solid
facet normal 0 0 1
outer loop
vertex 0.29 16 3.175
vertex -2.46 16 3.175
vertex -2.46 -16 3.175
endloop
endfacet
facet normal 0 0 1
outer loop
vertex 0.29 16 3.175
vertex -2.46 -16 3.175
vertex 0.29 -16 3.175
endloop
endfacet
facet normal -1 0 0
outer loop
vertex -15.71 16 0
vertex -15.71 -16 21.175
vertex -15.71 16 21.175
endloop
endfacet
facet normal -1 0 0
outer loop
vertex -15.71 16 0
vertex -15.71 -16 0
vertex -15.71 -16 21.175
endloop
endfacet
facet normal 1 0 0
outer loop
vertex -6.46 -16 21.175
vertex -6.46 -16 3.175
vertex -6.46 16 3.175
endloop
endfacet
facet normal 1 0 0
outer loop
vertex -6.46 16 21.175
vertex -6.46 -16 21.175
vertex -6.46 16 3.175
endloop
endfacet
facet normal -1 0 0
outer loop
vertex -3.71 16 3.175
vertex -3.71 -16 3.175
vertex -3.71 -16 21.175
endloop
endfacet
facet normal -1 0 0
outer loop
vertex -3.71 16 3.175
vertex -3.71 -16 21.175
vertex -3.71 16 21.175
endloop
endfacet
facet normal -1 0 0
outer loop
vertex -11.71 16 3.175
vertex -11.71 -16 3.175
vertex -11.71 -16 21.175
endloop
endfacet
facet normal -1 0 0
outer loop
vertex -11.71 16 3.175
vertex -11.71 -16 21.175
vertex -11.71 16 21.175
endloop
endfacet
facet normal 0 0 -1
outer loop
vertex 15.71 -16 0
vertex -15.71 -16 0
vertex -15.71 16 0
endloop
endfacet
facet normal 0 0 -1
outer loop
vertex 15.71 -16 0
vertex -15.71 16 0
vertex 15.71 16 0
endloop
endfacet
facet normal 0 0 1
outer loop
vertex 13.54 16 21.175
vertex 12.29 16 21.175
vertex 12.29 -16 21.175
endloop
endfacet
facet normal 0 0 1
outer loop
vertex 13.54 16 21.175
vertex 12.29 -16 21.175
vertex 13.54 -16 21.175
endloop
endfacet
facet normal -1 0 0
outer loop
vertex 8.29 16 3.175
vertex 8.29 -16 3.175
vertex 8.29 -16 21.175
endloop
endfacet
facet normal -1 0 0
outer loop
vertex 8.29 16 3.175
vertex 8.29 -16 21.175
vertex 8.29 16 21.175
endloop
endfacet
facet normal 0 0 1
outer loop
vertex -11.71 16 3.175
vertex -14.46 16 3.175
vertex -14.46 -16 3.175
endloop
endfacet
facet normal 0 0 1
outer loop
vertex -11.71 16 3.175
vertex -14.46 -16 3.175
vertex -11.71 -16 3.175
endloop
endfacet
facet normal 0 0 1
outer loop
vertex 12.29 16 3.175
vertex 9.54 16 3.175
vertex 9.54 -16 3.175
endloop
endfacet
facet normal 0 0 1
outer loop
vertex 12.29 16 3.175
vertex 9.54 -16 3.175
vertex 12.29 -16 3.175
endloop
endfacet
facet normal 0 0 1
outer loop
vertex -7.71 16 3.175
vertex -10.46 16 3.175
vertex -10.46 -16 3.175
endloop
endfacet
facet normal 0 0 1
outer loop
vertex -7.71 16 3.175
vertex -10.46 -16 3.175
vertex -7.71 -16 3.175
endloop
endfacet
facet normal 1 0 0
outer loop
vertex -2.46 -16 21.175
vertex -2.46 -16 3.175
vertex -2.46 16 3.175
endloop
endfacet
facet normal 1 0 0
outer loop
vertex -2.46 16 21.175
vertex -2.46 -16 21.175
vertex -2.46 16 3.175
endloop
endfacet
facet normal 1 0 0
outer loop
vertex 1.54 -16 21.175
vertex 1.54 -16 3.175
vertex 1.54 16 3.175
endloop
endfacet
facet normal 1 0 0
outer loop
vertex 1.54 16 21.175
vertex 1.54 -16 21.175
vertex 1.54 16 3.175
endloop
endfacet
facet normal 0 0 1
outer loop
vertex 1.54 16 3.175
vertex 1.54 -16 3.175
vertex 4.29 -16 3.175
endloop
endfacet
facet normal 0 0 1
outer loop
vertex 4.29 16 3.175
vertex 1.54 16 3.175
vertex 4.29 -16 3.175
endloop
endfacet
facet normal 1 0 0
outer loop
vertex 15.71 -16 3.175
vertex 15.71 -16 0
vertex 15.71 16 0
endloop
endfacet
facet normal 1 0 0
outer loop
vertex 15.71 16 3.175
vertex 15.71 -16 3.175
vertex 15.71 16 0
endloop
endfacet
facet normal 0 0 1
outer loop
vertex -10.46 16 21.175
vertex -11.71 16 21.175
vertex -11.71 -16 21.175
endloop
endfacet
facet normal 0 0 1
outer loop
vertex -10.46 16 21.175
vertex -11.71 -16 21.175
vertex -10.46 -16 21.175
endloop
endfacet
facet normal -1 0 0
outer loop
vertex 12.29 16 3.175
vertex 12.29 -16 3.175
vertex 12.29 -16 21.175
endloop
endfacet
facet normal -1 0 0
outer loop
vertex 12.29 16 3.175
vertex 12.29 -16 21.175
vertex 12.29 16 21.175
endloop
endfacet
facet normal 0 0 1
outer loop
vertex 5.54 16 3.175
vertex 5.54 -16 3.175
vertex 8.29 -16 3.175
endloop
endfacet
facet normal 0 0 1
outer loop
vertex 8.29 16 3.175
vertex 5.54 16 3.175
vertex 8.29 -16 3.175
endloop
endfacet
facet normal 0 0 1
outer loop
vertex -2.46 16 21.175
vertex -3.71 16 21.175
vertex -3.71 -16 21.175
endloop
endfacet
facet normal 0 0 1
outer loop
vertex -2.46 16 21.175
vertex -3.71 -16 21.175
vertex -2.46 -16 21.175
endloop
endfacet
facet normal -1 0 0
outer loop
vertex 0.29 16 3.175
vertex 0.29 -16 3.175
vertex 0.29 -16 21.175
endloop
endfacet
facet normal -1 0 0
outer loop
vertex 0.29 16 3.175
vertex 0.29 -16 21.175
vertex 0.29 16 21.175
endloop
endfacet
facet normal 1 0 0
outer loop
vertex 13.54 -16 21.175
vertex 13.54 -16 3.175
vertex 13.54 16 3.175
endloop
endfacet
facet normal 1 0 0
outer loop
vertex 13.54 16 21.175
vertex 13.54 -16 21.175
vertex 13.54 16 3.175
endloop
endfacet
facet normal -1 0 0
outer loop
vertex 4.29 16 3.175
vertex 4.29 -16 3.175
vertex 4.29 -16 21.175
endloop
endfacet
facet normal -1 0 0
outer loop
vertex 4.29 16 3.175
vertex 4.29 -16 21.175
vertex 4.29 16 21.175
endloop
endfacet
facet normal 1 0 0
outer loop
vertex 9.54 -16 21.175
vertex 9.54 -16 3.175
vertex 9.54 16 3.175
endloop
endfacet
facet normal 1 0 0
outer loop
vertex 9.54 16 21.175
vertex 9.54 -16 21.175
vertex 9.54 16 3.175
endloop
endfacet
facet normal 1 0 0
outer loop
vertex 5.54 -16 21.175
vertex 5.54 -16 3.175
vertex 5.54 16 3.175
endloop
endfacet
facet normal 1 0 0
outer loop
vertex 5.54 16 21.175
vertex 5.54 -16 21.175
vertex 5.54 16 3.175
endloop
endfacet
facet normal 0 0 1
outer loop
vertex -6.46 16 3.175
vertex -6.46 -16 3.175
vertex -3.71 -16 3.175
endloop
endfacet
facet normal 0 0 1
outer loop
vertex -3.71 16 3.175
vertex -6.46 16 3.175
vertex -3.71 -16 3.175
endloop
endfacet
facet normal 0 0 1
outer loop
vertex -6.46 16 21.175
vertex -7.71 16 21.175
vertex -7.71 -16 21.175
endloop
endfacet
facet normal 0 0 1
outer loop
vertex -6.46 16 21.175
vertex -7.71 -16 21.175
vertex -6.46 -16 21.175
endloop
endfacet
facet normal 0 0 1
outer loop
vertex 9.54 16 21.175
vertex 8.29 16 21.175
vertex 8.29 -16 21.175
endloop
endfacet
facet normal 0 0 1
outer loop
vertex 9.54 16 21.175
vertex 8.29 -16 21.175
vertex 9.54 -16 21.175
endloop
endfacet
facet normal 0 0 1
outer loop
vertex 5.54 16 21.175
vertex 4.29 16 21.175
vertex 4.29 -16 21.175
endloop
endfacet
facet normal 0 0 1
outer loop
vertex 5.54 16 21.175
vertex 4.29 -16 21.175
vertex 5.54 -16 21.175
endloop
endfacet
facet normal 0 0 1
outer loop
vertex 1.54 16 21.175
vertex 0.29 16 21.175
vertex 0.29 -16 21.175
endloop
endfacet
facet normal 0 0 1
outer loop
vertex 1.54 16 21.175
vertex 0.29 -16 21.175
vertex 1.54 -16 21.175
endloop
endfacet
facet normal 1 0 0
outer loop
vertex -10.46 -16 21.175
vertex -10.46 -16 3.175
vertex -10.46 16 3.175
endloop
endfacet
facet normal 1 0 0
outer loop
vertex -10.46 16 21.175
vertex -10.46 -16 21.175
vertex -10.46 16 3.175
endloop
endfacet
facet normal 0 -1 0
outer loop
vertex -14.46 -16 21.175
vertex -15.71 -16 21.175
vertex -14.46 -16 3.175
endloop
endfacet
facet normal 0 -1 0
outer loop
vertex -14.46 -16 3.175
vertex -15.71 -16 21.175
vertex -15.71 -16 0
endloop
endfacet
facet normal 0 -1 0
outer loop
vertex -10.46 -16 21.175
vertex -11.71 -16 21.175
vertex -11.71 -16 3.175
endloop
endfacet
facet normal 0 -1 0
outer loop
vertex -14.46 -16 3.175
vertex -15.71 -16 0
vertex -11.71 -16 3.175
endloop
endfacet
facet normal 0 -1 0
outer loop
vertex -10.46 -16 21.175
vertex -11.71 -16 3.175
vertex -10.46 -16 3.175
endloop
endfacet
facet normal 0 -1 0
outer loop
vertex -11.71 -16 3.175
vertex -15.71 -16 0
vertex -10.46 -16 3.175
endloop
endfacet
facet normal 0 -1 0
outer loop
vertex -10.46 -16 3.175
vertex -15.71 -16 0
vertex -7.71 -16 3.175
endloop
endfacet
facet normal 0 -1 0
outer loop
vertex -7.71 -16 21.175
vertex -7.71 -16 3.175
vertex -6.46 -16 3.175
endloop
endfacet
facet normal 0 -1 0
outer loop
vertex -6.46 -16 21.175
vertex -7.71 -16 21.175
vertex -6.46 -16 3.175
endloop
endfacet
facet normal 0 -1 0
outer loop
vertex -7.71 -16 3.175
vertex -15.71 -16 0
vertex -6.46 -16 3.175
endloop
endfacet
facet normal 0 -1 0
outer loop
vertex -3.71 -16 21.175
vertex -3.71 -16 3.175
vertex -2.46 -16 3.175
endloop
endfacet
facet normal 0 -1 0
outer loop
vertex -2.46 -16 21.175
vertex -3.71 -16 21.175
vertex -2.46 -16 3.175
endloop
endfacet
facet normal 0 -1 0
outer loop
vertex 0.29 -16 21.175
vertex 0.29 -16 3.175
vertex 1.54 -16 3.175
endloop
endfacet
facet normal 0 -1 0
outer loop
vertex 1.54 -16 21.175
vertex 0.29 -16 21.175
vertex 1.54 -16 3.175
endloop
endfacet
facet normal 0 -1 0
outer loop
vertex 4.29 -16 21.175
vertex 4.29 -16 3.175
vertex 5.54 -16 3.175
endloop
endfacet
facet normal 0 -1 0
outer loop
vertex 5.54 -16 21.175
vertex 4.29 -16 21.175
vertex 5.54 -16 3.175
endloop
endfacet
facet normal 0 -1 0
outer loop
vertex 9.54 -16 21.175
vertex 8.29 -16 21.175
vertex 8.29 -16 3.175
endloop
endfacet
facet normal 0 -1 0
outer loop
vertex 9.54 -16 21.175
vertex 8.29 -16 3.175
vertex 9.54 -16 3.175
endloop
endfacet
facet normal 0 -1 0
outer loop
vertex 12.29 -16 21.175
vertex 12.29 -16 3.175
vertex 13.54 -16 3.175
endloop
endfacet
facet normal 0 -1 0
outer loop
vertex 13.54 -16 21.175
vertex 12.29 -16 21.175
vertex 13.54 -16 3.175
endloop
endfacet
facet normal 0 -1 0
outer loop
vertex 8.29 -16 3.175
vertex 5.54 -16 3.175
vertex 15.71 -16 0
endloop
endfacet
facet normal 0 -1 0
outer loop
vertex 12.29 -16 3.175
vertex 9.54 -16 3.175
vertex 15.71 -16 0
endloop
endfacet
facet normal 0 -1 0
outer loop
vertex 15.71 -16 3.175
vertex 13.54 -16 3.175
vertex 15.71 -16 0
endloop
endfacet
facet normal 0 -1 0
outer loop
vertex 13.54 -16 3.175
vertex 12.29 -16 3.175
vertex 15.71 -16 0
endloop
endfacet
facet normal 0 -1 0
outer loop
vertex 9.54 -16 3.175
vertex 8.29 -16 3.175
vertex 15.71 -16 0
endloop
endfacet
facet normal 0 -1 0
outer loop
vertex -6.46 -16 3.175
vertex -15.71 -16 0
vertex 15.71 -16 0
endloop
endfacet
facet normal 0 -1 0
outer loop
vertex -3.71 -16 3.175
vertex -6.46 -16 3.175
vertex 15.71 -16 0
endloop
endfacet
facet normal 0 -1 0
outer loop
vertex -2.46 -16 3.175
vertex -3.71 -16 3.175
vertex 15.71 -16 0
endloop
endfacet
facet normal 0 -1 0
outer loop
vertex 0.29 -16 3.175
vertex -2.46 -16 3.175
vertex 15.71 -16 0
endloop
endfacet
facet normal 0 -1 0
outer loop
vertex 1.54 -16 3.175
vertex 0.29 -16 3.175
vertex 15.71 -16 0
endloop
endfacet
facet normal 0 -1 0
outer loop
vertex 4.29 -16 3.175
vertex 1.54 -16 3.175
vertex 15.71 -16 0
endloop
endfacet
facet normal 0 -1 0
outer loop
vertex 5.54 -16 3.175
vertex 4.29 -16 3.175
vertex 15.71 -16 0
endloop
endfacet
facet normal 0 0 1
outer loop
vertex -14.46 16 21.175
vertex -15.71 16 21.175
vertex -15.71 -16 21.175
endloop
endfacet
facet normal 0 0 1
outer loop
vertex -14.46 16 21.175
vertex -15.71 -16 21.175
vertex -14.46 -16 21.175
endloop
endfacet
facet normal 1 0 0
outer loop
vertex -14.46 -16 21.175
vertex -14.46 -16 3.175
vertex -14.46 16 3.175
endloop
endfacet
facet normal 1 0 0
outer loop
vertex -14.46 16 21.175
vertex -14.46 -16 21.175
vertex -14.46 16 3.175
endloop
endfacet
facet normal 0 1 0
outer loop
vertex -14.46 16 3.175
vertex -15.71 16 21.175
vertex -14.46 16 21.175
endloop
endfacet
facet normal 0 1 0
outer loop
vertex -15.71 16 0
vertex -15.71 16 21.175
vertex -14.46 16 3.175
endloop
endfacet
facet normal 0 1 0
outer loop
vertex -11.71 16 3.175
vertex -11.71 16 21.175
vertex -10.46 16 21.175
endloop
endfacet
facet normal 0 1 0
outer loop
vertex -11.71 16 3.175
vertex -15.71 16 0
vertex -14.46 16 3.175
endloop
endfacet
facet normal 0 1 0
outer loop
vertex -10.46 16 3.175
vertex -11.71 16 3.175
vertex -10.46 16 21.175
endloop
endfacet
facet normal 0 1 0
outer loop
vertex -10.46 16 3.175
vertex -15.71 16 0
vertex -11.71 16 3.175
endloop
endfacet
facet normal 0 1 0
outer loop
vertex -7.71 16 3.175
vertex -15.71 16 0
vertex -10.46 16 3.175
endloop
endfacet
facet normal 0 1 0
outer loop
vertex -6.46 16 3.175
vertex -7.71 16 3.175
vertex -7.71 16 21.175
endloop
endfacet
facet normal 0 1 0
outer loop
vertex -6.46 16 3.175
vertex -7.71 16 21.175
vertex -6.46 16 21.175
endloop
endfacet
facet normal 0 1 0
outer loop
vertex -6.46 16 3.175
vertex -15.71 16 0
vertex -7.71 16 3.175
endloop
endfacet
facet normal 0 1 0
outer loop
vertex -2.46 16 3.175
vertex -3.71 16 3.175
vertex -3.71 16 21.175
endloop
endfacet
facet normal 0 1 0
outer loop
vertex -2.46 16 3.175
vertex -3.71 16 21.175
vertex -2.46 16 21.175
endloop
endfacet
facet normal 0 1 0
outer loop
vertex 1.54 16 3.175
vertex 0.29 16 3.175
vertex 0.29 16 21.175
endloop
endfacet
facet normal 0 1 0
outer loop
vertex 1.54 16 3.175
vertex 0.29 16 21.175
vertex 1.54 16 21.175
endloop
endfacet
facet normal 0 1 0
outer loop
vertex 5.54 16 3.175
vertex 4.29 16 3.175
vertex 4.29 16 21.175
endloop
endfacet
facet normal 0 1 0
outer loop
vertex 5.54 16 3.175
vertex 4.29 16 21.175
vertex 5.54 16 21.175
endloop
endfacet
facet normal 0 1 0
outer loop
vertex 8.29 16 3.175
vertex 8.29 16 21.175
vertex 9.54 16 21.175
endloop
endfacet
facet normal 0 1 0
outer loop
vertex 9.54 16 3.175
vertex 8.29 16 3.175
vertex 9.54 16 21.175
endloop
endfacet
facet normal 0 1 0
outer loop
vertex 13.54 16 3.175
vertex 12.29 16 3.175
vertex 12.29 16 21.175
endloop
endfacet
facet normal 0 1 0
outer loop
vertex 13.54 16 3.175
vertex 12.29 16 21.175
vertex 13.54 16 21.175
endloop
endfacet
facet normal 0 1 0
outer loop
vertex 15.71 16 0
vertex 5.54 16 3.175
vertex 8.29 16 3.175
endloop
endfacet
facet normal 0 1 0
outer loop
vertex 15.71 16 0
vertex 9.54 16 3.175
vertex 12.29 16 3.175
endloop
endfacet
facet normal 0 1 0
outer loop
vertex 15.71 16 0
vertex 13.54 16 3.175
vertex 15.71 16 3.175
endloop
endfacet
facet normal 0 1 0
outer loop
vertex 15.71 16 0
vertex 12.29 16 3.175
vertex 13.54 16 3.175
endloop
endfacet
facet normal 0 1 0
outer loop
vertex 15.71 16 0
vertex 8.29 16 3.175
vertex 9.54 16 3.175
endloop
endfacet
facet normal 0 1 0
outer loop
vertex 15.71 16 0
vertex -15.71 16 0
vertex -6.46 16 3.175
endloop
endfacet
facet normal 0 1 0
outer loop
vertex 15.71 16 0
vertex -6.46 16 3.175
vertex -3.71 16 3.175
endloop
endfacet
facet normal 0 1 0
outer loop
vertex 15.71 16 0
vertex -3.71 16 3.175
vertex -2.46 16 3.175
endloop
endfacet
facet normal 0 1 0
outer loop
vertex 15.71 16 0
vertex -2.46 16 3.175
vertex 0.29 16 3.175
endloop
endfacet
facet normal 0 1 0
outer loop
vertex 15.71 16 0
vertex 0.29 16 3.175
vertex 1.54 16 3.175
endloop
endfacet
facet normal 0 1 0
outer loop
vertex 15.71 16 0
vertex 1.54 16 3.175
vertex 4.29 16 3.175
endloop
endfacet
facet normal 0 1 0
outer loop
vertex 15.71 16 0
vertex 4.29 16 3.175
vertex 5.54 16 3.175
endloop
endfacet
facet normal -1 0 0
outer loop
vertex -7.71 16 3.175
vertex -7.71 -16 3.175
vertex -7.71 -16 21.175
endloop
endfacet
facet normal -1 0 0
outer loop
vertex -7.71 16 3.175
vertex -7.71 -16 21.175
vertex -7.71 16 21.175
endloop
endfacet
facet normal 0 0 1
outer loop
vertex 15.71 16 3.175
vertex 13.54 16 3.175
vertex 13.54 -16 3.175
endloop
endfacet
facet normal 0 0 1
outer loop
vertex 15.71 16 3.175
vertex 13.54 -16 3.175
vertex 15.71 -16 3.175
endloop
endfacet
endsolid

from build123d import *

# Parameters (mm, degrees)
SKETCH1_W           = 31.42
SKETCH1_H           = 32
BOSS_EXTRUDE1_DEPTH = 3.175
SKETCH2_W           = 1.25
SKETCH2_H           = 32
BOSS_EXTRUDE2_DEPTH = 18
LPATTERN1_COUNT     = 8
LPATTERN1_PITCH     = 4


with BuildPart() as part:
    # Sketch1 → Boss-Extrude1 (new body)
    with BuildSketch(Plane.XY):
        Rectangle(SKETCH1_W, SKETCH1_H)
    extrude(amount=BOSS_EXTRUDE1_DEPTH)

    # Sketch2 → Boss-Extrude2 (add)
    with BuildSketch(Plane.XY.offset(3.175)):
        with Locations((-15.085, 0)):
            Rectangle(SKETCH2_W, SKETCH2_H)
    boss_extrude2 = extrude(amount=BOSS_EXTRUDE2_DEPTH)

    # LPattern1: Boss-Extrude2 ×8
    with Locations(*[(i * LPATTERN1_PITCH, 0, 0) for i in range(1, LPATTERN1_COUNT)]):
        add(boss_extrude2)


solid = part.part
